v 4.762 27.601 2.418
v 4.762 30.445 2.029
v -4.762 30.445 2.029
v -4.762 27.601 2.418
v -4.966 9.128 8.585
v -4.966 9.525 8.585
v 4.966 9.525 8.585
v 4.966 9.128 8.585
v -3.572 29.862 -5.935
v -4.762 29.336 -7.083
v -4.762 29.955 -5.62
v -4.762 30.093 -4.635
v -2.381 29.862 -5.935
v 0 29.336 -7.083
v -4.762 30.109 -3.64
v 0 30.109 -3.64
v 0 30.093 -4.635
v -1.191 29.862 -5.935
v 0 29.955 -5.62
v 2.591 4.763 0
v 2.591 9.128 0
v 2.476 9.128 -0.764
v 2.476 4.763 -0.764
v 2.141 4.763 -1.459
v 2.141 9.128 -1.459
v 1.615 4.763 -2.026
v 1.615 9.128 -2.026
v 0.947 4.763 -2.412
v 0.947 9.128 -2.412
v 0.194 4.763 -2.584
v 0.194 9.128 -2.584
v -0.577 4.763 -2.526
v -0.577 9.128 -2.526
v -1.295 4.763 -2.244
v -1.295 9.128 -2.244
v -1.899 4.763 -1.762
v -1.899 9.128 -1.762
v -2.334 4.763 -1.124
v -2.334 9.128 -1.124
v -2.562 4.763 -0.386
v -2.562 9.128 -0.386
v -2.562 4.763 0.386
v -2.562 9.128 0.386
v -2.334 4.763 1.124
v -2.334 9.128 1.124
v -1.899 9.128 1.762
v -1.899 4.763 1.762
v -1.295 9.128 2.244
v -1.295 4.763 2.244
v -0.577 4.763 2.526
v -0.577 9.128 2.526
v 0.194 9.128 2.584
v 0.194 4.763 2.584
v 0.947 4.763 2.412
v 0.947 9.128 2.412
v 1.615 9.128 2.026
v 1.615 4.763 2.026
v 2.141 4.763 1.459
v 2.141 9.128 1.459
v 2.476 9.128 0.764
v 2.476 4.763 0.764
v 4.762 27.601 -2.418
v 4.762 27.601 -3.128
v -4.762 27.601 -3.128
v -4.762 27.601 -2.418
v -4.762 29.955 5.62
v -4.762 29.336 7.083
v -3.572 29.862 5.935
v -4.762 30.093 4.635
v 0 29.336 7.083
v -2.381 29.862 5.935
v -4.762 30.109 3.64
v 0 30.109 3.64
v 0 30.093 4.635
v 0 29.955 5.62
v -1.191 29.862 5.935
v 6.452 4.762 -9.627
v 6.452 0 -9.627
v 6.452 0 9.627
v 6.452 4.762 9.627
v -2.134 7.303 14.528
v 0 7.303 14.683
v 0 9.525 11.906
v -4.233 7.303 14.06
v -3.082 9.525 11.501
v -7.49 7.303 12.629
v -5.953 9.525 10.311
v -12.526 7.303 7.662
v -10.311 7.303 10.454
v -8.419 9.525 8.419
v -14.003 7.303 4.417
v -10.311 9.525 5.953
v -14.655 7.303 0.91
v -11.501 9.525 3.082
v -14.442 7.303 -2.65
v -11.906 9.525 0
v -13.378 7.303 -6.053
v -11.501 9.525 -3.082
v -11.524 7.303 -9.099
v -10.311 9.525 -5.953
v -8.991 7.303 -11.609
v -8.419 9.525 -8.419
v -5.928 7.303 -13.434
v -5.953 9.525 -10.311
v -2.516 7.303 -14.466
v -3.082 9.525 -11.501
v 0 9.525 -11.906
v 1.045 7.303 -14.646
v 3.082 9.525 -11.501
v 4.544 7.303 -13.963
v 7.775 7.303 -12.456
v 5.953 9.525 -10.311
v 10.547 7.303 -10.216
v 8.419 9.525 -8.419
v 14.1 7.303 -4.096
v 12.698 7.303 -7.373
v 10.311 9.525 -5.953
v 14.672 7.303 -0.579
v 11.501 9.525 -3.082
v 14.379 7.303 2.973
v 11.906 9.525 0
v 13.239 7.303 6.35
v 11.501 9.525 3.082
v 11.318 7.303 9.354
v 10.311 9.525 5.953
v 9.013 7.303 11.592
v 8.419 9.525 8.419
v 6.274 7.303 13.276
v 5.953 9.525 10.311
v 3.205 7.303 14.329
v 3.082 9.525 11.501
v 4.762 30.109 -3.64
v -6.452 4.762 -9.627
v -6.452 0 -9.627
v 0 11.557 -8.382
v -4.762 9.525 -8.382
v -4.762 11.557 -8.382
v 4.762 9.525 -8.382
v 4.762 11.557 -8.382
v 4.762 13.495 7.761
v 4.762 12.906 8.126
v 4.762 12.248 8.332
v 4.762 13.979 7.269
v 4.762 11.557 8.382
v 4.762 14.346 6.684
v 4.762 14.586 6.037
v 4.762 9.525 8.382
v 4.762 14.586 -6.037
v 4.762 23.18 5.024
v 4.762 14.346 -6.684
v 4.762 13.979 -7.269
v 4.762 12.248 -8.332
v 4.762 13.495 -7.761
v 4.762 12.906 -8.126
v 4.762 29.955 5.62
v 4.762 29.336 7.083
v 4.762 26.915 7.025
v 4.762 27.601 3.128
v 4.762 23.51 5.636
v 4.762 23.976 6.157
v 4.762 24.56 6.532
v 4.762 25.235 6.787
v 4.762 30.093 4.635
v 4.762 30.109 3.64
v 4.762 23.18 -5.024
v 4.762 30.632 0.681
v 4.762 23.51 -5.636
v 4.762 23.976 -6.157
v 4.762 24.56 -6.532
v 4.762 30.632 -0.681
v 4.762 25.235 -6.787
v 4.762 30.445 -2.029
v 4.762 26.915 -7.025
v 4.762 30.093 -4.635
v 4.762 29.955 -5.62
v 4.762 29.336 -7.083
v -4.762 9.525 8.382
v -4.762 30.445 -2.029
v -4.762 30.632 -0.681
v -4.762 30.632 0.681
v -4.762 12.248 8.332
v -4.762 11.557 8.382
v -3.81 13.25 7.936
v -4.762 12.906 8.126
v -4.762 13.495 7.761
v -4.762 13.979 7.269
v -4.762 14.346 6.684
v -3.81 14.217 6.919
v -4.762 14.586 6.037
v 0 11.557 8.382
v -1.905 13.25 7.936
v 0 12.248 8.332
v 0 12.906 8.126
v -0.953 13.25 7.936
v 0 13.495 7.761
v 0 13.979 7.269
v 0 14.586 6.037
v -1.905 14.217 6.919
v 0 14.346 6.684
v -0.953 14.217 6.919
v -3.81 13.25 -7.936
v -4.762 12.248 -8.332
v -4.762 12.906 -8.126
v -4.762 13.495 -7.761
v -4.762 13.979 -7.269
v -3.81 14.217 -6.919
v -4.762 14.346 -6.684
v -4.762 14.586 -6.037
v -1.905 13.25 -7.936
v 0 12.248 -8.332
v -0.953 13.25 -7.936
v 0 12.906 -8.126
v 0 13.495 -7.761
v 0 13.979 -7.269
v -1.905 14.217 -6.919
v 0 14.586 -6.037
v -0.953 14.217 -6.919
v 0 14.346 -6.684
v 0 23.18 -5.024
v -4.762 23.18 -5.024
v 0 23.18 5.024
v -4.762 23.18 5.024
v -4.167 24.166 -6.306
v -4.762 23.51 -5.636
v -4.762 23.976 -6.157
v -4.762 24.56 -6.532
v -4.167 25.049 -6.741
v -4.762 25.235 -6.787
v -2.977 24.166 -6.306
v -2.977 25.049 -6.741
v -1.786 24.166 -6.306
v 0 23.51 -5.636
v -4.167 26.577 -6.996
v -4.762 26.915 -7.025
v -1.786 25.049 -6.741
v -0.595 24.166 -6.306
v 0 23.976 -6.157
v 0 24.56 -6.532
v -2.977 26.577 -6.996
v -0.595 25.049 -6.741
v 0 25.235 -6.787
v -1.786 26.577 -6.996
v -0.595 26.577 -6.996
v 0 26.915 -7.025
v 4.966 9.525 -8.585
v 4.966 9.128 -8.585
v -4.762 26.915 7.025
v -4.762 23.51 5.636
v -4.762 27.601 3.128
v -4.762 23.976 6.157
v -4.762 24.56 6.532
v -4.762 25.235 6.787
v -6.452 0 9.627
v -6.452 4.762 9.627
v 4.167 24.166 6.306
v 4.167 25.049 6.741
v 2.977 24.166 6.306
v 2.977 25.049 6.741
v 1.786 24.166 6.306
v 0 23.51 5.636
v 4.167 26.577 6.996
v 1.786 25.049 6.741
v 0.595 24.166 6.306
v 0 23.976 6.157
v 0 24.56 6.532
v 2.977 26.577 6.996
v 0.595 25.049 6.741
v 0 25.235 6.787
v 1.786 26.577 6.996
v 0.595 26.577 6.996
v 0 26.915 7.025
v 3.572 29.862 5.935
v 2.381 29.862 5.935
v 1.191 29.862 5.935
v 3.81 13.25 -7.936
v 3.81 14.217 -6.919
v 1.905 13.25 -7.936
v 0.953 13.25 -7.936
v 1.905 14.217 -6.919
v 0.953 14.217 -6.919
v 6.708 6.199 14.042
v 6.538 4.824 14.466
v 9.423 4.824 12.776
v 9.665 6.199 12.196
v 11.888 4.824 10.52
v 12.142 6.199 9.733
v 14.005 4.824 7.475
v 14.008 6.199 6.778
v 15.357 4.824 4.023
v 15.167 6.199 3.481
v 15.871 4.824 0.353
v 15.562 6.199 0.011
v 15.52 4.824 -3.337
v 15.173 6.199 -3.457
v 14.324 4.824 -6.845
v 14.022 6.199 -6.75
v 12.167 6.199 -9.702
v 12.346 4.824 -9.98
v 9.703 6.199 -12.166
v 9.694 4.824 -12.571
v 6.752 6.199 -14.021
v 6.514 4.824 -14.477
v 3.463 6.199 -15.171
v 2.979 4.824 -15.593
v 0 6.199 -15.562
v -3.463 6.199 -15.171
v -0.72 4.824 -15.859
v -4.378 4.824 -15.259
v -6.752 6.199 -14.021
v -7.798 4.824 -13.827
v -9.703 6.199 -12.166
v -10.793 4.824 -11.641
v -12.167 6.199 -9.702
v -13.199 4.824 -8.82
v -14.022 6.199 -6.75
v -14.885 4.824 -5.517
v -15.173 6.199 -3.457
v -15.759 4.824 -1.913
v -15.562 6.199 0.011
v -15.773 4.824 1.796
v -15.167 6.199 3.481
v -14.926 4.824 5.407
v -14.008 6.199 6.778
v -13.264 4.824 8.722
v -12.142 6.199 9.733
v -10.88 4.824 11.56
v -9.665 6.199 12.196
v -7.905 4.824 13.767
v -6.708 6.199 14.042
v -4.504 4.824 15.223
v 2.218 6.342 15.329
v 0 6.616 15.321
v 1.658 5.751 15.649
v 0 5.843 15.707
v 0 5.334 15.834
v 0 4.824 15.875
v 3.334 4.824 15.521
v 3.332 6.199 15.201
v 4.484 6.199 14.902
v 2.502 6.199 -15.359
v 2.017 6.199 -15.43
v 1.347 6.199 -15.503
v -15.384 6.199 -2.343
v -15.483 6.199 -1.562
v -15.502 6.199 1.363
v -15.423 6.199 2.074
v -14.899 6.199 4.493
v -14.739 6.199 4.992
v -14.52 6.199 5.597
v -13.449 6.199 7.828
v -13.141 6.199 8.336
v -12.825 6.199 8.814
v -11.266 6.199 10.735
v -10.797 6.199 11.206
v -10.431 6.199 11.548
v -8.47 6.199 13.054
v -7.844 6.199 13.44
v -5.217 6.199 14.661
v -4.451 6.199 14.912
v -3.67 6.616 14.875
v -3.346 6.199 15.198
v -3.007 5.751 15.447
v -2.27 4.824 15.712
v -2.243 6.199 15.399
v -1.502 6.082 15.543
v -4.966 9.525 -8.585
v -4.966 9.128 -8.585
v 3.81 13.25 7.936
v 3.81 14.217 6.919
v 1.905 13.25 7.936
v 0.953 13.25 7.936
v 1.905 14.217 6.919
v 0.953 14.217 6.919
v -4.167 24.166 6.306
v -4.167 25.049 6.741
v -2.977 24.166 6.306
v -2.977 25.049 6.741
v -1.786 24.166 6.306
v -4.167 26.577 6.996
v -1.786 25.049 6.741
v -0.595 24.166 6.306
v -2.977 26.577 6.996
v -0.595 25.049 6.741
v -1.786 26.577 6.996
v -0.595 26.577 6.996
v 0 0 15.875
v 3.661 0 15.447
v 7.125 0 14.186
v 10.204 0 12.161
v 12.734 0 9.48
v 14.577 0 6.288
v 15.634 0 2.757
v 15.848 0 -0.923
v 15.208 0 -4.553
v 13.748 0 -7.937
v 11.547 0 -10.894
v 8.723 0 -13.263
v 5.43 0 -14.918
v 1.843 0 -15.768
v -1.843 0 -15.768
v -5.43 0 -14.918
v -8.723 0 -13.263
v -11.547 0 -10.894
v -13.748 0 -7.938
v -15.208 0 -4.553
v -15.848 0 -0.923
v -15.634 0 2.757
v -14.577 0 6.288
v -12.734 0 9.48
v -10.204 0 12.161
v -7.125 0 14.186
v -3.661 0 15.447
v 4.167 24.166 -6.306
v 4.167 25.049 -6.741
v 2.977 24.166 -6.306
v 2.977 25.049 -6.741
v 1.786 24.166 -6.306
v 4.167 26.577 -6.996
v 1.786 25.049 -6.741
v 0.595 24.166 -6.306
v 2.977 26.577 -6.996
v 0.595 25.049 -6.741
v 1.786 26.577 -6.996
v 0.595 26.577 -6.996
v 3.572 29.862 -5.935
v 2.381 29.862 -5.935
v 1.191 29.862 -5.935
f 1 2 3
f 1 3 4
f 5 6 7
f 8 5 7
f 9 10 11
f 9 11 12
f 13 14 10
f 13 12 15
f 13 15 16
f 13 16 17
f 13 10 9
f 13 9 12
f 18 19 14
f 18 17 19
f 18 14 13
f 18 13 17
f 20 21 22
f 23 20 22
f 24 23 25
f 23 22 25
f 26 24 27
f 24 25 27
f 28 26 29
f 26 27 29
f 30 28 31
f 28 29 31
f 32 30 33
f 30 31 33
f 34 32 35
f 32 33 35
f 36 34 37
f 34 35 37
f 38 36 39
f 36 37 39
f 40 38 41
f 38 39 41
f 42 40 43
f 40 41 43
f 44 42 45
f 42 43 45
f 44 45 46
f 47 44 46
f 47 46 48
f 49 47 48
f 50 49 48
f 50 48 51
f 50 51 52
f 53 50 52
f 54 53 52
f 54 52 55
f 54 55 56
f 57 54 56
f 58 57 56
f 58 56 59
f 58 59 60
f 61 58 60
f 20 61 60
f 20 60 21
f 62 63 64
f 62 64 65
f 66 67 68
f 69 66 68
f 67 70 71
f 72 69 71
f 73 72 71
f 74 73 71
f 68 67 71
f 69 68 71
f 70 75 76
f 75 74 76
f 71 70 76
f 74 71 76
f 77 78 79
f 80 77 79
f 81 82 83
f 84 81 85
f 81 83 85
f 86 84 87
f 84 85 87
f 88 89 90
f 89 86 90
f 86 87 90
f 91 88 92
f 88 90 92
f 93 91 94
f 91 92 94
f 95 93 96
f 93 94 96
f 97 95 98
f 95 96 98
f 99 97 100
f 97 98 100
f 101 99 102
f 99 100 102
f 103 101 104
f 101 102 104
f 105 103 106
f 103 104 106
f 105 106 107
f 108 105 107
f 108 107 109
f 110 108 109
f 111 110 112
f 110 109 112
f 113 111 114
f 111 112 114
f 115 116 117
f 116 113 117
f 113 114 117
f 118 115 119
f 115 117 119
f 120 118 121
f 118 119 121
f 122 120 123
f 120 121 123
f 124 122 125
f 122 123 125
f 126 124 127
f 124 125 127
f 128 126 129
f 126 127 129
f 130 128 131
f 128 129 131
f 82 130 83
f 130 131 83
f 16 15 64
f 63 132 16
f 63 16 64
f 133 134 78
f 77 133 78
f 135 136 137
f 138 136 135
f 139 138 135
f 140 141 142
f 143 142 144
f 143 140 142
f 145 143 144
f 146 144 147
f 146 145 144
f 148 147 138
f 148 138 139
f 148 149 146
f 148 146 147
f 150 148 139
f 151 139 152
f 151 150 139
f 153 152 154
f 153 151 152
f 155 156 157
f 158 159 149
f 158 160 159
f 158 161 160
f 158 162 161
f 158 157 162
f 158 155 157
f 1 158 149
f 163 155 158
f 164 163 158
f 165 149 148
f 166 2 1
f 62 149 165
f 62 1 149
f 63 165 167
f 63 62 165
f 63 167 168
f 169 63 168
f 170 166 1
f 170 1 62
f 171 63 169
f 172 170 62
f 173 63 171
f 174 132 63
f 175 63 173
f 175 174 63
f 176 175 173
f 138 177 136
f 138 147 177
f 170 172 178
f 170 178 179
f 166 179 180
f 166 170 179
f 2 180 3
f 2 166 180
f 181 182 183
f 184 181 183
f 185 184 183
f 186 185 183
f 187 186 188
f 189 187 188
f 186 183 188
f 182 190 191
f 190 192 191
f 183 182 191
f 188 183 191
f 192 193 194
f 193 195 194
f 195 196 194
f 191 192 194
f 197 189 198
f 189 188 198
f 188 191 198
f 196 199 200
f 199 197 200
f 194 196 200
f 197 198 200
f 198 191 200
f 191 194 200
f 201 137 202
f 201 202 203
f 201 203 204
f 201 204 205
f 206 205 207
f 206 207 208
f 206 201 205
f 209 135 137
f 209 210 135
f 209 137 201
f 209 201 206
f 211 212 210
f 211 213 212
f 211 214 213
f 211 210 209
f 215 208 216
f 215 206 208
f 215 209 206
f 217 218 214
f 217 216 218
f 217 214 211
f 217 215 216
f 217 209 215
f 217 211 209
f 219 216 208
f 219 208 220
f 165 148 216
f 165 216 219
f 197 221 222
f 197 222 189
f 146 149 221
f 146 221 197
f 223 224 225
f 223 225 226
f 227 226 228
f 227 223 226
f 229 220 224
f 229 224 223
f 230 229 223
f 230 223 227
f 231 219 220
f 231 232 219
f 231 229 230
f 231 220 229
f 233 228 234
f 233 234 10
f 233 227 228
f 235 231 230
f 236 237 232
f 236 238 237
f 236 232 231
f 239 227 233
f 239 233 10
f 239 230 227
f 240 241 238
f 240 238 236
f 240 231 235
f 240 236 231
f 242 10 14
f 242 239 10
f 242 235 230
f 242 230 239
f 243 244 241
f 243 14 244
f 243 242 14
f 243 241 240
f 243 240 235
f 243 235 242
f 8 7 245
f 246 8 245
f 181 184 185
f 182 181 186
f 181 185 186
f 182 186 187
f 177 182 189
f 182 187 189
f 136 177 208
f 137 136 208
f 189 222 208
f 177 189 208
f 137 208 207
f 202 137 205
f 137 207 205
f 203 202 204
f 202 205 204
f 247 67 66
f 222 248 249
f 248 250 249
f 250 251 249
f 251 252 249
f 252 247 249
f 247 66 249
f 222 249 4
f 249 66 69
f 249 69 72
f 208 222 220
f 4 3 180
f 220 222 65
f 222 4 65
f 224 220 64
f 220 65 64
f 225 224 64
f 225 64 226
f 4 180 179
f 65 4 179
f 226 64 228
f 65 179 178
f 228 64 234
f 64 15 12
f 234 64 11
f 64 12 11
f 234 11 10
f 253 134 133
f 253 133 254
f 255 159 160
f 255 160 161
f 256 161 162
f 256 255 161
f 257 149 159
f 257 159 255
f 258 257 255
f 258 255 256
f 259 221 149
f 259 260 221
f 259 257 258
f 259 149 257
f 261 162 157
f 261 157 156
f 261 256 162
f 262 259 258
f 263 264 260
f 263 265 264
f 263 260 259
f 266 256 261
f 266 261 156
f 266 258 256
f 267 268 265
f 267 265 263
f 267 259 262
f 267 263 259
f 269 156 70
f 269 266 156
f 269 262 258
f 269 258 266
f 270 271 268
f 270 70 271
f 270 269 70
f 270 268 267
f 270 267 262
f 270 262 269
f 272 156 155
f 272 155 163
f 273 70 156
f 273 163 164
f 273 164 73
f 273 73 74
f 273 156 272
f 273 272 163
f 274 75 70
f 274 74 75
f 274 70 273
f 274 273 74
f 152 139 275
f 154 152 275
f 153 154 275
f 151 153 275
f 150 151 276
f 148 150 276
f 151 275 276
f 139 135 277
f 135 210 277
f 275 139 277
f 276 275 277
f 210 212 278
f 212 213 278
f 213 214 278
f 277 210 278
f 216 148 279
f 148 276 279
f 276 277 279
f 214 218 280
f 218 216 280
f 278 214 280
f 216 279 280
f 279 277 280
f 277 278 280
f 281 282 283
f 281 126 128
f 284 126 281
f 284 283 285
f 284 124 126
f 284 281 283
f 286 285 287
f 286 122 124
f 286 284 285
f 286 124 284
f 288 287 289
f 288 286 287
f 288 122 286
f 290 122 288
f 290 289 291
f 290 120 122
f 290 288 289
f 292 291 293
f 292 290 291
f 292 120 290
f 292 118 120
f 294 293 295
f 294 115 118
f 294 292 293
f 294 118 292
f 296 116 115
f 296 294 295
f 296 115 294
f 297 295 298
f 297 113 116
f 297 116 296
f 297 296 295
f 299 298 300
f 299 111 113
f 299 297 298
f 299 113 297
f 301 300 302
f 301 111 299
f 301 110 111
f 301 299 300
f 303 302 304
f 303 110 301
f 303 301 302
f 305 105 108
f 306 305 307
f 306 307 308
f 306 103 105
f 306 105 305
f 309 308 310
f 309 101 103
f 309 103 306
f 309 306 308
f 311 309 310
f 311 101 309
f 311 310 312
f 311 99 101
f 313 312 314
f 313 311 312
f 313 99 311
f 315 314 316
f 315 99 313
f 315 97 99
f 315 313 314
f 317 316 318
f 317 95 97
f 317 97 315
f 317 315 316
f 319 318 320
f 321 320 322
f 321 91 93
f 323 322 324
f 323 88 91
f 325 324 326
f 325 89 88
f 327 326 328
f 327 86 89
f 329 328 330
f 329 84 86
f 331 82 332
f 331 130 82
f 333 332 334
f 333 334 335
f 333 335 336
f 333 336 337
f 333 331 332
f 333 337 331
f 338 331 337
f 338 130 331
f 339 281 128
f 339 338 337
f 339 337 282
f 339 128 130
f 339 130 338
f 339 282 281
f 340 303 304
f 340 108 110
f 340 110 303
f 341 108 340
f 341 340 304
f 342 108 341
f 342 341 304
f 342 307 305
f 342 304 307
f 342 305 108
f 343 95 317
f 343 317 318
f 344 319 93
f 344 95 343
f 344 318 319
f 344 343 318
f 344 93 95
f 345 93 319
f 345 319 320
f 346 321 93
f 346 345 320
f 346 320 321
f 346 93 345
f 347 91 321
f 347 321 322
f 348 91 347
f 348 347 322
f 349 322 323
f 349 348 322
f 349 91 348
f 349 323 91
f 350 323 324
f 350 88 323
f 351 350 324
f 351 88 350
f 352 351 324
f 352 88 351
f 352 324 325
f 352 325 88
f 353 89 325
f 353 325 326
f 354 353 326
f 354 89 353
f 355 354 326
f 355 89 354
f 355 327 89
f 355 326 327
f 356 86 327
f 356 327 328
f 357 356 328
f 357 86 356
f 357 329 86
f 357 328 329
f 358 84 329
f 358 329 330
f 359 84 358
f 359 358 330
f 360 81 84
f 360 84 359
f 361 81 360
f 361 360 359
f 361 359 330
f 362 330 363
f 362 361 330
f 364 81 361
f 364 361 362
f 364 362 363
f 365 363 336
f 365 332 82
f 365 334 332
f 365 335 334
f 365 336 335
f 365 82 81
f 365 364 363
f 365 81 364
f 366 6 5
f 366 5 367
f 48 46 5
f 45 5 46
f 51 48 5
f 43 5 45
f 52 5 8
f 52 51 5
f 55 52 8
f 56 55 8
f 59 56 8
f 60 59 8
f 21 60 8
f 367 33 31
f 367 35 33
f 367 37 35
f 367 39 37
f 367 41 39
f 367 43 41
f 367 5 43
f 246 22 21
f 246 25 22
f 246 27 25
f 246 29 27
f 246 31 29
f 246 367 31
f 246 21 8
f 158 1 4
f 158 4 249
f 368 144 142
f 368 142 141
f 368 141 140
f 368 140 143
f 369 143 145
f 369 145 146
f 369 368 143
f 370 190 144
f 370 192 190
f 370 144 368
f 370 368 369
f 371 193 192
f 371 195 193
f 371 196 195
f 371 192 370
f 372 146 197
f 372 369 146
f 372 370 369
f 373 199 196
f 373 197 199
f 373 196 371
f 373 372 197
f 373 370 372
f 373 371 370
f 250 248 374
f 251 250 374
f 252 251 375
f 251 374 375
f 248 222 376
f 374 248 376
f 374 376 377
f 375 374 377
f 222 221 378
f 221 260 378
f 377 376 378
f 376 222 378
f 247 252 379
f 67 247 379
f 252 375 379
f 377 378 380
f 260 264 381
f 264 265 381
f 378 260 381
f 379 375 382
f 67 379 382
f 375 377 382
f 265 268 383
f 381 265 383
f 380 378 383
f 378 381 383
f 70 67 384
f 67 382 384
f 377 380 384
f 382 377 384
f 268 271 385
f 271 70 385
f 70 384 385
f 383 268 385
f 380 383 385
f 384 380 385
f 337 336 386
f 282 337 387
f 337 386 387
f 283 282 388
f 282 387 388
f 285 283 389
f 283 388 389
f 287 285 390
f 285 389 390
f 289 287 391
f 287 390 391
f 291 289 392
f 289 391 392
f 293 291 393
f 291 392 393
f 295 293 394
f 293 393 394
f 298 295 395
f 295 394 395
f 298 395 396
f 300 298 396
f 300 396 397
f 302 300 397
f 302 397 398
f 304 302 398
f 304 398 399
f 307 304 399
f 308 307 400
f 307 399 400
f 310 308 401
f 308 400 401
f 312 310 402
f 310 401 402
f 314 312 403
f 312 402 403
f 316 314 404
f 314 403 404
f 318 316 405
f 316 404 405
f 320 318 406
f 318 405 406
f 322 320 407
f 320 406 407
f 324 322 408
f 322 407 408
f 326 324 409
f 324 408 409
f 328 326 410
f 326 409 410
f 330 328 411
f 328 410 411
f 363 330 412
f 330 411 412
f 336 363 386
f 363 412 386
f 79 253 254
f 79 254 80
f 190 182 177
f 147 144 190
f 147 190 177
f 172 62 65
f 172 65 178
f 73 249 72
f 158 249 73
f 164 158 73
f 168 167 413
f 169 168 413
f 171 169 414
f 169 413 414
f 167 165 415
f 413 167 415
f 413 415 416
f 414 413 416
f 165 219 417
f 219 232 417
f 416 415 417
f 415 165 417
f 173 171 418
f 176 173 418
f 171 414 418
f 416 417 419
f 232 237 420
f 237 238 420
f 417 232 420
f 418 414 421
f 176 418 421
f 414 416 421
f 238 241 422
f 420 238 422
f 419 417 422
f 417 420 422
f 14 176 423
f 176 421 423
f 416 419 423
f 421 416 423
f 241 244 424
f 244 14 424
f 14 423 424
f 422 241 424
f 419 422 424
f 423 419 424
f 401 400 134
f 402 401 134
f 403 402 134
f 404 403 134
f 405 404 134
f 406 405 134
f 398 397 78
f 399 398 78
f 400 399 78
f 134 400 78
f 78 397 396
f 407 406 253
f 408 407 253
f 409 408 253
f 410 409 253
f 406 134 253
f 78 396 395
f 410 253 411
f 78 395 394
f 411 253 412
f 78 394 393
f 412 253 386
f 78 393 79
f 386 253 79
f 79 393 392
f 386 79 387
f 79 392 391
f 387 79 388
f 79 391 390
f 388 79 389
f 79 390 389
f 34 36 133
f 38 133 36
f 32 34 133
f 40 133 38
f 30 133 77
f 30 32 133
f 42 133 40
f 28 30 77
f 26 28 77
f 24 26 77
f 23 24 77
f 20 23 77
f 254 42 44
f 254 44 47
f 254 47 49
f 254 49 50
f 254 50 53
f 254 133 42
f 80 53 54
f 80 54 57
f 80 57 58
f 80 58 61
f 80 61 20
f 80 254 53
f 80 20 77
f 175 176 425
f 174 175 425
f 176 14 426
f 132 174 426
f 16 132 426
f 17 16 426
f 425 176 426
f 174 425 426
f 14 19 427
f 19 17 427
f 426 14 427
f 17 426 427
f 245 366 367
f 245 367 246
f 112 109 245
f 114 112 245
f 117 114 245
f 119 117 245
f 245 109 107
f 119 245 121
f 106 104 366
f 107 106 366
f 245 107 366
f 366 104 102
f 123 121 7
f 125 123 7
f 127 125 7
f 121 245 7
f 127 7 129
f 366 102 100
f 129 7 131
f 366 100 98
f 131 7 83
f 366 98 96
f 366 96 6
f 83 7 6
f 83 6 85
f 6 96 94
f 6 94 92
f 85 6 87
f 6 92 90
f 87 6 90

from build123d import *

# Parameters (mm, degrees)
SKETCH1_R                  = 15.875
BOSS_EXTRUDE1_DEPTH        = 6.35
FILLET1_R                  = 3.175
SKETCH3_W                  = 12.9032
SKETCH3_H                  = 19.2532
CUT_EXTRUDE1_DEPTH         = 4.7625
F_6_0_204_DIAMETER_HOLE1_D = 5.1816
BOSS_EXTRUDE2_DEPTH        = 4.7625
SKETCH7_W                  = 9.9314
SKETCH7_H                  = 17.1704
CUT_EXTRUDE2_DEPTH         = 0.396875


with BuildPart() as part:
    # Sketch1 → Boss-Extrude1 (new body)
    with BuildSketch(Plane(origin=(0, 0, 0), x_dir=(1, 0, 0), z_dir=(0, 1, 0))):
        with Locations(Location((0, 0, 0), (0, 0, 270))):
            Circle(SKETCH1_R)
    extrude(amount=BOSS_EXTRUDE1_DEPTH)

    # Sketch2 → Revolve1 (revolve)
    with BuildSketch(Plane.XY, mode=Mode.PRIVATE) as revolve1_sk:
        Polygon((-15.875, 6.35), (-11.90625, 9.525), (0, 9.525), (0, 6.35), align=None)
    revolve(revolve1_sk.sketch.rotate(Axis((0, 9.525, 0), (0, -1, 0)), 270), axis=Axis((0, 9.525, 0), (0, -1, 0)))

    # Fillet1
    fillet1_edges = [part.edges().sort_by_distance(p)[0] for p in [
        (0, 6.35, -15.875),
    ]]
    fillet(fillet1_edges, radius=FILLET1_R)

    # Sketch3 → Cut-Extrude1 (cut)
    with BuildSketch(Plane.XZ):
        Rectangle(SKETCH3_W, SKETCH3_H)
    extrude(amount=-CUT_EXTRUDE1_DEPTH, mode=Mode.SUBTRACT)

    # #6 (0.204) Diameter Hole1 (through all)
    with Locations(Plane(origin=(0, 4.7625, 0), x_dir=(-1, 0, 0), z_dir=(0, -1, 0))):
        with Locations((0, 0)):
            Hole(F_6_0_204_DIAMETER_HOLE1_D / 2)

    # Sketch7 → Cut-Extrude2 (cut)
    with BuildSketch(Plane(origin=(0, 9.525, 0), x_dir=(1, 0, 0), z_dir=(0, 1, 0))):
        Rectangle(SKETCH7_W, SKETCH7_H)
    extrude(amount=-CUT_EXTRUDE2_DEPTH, mode=Mode.SUBTRACT)


with BuildPart() as body_2:
    # Sketch6 → Boss-Extrude2 (new, symmetric)
    with BuildSketch(Plane(origin=(0, 0, 0), x_dir=(0, 0, -1), z_dir=(1, 0, 0))):
        with BuildLine():
            Line((-8.382, 9.525), (8.382, 9.525))
            Line((8.382, 9.525), (8.382, 11.557))
            add(Edge.make_bspline(
                [(8.382, 11.557), (8.382, 11.857982863), (8.344224983, 12.454053236), (7.98523621, 13.245378051), (7.486257094, 13.833251875), (6.838643181, 14.295177257), (6.349411081, 14.510920687), (6.037210454, 14.585970807)],
                knots=[0, 0, 0, 0, 0.216472078, 0.427785421, 0.616070617, 0.768549245, 1, 1, 1, 1], degree=3))
            Line((6.037210454, 14.585970807), (5.024476334, 23.180395331))
            add(Edge.make_bspline(
                [(5.024476334, 23.180395331), (5.307085674, 23.280525666), (5.76899713, 23.574819115), (6.276635868, 24.072313749), (6.547711401, 24.582995668), (6.769096893, 25.048838443), (6.865431256, 25.738772721), (7.009040885, 26.506637133), (7.066947947, 27.761736206), (7.085878737, 28.680934811), (7.082935602, 29.336149278)],
                knots=[0, 0, 0, 0, 0.128720037, 0.235851556, 0.302405084, 0.378128791, 0.457345209, 0.601695188, 0.716525225, 1, 1, 1, 1], degree=3))
            add(Edge.make_bspline(
                [(7.082935602, 29.336149278), (6.838796737, 29.455688295), (6.468231657, 29.657538579), (5.90732823, 29.882104351), (5.012922295, 30.119470051), (4.226581458, 30.108198276), (3.640384417, 30.109079786)],
                knots=[0, 0, 0, 0, 0.227779067, 0.352761532, 0.505199425, 1, 1, 1, 1], degree=3))
            Line((3.640384417, 30.109079786), (3.128109303, 27.600638464))
            Line((3.128109303, 27.600638464), (2.41829426, 27.600638464))
            Line((2.41829426, 27.600638464), (2.028639394, 30.44517579))
            ThreePointArc((2.028639394, 30.44517579), (0, 30.655626766), (-2.028639394, 30.44517579))
            Line((-2.028639394, 30.44517579), (-2.41829426, 27.600638464))
            Line((-2.41829426, 27.600638464), (-3.128109303, 27.600638464))
            Line((-3.128109303, 27.600638464), (-3.640384417, 30.109079786))
            add(Edge.make_bspline(
                [(-7.082935602, 29.336149278), (-6.838796737, 29.455688295), (-6.468231657, 29.657538579), (-5.90732823, 29.882104351), (-5.012922295, 30.119470051), (-4.226581458, 30.108198276), (-3.640384417, 30.109079786)],
                knots=[0, 0, 0, 0, 0.227779067, 0.352761532, 0.505199425, 1, 1, 1, 1], degree=3))
            add(Edge.make_bspline(
                [(-5.024476334, 23.180395331), (-5.307085674, 23.280525666), (-5.76899713, 23.574819115), (-6.276635868, 24.072313749), (-6.547711401, 24.582995668), (-6.769096893, 25.048838443), (-6.865431256, 25.738772721), (-7.009040885, 26.506637133), (-7.066947947, 27.761736206), (-7.085878737, 28.680934811), (-7.082935602, 29.336149278)],
                knots=[0, 0, 0, 0, 0.128720037, 0.235851556, 0.302405084, 0.378128791, 0.457345209, 0.601695188, 0.716525225, 1, 1, 1, 1], degree=3))
            Line((-5.024476334, 23.180395331), (-6.037210454, 14.585970807))
            add(Edge.make_bspline(
                [(-8.382, 11.557), (-8.382, 11.857982863), (-8.344224983, 12.454053236), (-7.98523621, 13.245378051), (-7.486257094, 13.833251875), (-6.838643181, 14.295177257), (-6.349411081, 14.510920687), (-6.037210454, 14.585970807)],
                knots=[0, 0, 0, 0, 0.216472078, 0.427785421, 0.616070617, 0.768549245, 1, 1, 1, 1], degree=3))
            Line((-8.382, 11.557), (-8.382, 9.525))
        make_face()
    extrude(amount=BOSS_EXTRUDE2_DEPTH, both=True)


solid = Compound([part.part, body_2.part])
